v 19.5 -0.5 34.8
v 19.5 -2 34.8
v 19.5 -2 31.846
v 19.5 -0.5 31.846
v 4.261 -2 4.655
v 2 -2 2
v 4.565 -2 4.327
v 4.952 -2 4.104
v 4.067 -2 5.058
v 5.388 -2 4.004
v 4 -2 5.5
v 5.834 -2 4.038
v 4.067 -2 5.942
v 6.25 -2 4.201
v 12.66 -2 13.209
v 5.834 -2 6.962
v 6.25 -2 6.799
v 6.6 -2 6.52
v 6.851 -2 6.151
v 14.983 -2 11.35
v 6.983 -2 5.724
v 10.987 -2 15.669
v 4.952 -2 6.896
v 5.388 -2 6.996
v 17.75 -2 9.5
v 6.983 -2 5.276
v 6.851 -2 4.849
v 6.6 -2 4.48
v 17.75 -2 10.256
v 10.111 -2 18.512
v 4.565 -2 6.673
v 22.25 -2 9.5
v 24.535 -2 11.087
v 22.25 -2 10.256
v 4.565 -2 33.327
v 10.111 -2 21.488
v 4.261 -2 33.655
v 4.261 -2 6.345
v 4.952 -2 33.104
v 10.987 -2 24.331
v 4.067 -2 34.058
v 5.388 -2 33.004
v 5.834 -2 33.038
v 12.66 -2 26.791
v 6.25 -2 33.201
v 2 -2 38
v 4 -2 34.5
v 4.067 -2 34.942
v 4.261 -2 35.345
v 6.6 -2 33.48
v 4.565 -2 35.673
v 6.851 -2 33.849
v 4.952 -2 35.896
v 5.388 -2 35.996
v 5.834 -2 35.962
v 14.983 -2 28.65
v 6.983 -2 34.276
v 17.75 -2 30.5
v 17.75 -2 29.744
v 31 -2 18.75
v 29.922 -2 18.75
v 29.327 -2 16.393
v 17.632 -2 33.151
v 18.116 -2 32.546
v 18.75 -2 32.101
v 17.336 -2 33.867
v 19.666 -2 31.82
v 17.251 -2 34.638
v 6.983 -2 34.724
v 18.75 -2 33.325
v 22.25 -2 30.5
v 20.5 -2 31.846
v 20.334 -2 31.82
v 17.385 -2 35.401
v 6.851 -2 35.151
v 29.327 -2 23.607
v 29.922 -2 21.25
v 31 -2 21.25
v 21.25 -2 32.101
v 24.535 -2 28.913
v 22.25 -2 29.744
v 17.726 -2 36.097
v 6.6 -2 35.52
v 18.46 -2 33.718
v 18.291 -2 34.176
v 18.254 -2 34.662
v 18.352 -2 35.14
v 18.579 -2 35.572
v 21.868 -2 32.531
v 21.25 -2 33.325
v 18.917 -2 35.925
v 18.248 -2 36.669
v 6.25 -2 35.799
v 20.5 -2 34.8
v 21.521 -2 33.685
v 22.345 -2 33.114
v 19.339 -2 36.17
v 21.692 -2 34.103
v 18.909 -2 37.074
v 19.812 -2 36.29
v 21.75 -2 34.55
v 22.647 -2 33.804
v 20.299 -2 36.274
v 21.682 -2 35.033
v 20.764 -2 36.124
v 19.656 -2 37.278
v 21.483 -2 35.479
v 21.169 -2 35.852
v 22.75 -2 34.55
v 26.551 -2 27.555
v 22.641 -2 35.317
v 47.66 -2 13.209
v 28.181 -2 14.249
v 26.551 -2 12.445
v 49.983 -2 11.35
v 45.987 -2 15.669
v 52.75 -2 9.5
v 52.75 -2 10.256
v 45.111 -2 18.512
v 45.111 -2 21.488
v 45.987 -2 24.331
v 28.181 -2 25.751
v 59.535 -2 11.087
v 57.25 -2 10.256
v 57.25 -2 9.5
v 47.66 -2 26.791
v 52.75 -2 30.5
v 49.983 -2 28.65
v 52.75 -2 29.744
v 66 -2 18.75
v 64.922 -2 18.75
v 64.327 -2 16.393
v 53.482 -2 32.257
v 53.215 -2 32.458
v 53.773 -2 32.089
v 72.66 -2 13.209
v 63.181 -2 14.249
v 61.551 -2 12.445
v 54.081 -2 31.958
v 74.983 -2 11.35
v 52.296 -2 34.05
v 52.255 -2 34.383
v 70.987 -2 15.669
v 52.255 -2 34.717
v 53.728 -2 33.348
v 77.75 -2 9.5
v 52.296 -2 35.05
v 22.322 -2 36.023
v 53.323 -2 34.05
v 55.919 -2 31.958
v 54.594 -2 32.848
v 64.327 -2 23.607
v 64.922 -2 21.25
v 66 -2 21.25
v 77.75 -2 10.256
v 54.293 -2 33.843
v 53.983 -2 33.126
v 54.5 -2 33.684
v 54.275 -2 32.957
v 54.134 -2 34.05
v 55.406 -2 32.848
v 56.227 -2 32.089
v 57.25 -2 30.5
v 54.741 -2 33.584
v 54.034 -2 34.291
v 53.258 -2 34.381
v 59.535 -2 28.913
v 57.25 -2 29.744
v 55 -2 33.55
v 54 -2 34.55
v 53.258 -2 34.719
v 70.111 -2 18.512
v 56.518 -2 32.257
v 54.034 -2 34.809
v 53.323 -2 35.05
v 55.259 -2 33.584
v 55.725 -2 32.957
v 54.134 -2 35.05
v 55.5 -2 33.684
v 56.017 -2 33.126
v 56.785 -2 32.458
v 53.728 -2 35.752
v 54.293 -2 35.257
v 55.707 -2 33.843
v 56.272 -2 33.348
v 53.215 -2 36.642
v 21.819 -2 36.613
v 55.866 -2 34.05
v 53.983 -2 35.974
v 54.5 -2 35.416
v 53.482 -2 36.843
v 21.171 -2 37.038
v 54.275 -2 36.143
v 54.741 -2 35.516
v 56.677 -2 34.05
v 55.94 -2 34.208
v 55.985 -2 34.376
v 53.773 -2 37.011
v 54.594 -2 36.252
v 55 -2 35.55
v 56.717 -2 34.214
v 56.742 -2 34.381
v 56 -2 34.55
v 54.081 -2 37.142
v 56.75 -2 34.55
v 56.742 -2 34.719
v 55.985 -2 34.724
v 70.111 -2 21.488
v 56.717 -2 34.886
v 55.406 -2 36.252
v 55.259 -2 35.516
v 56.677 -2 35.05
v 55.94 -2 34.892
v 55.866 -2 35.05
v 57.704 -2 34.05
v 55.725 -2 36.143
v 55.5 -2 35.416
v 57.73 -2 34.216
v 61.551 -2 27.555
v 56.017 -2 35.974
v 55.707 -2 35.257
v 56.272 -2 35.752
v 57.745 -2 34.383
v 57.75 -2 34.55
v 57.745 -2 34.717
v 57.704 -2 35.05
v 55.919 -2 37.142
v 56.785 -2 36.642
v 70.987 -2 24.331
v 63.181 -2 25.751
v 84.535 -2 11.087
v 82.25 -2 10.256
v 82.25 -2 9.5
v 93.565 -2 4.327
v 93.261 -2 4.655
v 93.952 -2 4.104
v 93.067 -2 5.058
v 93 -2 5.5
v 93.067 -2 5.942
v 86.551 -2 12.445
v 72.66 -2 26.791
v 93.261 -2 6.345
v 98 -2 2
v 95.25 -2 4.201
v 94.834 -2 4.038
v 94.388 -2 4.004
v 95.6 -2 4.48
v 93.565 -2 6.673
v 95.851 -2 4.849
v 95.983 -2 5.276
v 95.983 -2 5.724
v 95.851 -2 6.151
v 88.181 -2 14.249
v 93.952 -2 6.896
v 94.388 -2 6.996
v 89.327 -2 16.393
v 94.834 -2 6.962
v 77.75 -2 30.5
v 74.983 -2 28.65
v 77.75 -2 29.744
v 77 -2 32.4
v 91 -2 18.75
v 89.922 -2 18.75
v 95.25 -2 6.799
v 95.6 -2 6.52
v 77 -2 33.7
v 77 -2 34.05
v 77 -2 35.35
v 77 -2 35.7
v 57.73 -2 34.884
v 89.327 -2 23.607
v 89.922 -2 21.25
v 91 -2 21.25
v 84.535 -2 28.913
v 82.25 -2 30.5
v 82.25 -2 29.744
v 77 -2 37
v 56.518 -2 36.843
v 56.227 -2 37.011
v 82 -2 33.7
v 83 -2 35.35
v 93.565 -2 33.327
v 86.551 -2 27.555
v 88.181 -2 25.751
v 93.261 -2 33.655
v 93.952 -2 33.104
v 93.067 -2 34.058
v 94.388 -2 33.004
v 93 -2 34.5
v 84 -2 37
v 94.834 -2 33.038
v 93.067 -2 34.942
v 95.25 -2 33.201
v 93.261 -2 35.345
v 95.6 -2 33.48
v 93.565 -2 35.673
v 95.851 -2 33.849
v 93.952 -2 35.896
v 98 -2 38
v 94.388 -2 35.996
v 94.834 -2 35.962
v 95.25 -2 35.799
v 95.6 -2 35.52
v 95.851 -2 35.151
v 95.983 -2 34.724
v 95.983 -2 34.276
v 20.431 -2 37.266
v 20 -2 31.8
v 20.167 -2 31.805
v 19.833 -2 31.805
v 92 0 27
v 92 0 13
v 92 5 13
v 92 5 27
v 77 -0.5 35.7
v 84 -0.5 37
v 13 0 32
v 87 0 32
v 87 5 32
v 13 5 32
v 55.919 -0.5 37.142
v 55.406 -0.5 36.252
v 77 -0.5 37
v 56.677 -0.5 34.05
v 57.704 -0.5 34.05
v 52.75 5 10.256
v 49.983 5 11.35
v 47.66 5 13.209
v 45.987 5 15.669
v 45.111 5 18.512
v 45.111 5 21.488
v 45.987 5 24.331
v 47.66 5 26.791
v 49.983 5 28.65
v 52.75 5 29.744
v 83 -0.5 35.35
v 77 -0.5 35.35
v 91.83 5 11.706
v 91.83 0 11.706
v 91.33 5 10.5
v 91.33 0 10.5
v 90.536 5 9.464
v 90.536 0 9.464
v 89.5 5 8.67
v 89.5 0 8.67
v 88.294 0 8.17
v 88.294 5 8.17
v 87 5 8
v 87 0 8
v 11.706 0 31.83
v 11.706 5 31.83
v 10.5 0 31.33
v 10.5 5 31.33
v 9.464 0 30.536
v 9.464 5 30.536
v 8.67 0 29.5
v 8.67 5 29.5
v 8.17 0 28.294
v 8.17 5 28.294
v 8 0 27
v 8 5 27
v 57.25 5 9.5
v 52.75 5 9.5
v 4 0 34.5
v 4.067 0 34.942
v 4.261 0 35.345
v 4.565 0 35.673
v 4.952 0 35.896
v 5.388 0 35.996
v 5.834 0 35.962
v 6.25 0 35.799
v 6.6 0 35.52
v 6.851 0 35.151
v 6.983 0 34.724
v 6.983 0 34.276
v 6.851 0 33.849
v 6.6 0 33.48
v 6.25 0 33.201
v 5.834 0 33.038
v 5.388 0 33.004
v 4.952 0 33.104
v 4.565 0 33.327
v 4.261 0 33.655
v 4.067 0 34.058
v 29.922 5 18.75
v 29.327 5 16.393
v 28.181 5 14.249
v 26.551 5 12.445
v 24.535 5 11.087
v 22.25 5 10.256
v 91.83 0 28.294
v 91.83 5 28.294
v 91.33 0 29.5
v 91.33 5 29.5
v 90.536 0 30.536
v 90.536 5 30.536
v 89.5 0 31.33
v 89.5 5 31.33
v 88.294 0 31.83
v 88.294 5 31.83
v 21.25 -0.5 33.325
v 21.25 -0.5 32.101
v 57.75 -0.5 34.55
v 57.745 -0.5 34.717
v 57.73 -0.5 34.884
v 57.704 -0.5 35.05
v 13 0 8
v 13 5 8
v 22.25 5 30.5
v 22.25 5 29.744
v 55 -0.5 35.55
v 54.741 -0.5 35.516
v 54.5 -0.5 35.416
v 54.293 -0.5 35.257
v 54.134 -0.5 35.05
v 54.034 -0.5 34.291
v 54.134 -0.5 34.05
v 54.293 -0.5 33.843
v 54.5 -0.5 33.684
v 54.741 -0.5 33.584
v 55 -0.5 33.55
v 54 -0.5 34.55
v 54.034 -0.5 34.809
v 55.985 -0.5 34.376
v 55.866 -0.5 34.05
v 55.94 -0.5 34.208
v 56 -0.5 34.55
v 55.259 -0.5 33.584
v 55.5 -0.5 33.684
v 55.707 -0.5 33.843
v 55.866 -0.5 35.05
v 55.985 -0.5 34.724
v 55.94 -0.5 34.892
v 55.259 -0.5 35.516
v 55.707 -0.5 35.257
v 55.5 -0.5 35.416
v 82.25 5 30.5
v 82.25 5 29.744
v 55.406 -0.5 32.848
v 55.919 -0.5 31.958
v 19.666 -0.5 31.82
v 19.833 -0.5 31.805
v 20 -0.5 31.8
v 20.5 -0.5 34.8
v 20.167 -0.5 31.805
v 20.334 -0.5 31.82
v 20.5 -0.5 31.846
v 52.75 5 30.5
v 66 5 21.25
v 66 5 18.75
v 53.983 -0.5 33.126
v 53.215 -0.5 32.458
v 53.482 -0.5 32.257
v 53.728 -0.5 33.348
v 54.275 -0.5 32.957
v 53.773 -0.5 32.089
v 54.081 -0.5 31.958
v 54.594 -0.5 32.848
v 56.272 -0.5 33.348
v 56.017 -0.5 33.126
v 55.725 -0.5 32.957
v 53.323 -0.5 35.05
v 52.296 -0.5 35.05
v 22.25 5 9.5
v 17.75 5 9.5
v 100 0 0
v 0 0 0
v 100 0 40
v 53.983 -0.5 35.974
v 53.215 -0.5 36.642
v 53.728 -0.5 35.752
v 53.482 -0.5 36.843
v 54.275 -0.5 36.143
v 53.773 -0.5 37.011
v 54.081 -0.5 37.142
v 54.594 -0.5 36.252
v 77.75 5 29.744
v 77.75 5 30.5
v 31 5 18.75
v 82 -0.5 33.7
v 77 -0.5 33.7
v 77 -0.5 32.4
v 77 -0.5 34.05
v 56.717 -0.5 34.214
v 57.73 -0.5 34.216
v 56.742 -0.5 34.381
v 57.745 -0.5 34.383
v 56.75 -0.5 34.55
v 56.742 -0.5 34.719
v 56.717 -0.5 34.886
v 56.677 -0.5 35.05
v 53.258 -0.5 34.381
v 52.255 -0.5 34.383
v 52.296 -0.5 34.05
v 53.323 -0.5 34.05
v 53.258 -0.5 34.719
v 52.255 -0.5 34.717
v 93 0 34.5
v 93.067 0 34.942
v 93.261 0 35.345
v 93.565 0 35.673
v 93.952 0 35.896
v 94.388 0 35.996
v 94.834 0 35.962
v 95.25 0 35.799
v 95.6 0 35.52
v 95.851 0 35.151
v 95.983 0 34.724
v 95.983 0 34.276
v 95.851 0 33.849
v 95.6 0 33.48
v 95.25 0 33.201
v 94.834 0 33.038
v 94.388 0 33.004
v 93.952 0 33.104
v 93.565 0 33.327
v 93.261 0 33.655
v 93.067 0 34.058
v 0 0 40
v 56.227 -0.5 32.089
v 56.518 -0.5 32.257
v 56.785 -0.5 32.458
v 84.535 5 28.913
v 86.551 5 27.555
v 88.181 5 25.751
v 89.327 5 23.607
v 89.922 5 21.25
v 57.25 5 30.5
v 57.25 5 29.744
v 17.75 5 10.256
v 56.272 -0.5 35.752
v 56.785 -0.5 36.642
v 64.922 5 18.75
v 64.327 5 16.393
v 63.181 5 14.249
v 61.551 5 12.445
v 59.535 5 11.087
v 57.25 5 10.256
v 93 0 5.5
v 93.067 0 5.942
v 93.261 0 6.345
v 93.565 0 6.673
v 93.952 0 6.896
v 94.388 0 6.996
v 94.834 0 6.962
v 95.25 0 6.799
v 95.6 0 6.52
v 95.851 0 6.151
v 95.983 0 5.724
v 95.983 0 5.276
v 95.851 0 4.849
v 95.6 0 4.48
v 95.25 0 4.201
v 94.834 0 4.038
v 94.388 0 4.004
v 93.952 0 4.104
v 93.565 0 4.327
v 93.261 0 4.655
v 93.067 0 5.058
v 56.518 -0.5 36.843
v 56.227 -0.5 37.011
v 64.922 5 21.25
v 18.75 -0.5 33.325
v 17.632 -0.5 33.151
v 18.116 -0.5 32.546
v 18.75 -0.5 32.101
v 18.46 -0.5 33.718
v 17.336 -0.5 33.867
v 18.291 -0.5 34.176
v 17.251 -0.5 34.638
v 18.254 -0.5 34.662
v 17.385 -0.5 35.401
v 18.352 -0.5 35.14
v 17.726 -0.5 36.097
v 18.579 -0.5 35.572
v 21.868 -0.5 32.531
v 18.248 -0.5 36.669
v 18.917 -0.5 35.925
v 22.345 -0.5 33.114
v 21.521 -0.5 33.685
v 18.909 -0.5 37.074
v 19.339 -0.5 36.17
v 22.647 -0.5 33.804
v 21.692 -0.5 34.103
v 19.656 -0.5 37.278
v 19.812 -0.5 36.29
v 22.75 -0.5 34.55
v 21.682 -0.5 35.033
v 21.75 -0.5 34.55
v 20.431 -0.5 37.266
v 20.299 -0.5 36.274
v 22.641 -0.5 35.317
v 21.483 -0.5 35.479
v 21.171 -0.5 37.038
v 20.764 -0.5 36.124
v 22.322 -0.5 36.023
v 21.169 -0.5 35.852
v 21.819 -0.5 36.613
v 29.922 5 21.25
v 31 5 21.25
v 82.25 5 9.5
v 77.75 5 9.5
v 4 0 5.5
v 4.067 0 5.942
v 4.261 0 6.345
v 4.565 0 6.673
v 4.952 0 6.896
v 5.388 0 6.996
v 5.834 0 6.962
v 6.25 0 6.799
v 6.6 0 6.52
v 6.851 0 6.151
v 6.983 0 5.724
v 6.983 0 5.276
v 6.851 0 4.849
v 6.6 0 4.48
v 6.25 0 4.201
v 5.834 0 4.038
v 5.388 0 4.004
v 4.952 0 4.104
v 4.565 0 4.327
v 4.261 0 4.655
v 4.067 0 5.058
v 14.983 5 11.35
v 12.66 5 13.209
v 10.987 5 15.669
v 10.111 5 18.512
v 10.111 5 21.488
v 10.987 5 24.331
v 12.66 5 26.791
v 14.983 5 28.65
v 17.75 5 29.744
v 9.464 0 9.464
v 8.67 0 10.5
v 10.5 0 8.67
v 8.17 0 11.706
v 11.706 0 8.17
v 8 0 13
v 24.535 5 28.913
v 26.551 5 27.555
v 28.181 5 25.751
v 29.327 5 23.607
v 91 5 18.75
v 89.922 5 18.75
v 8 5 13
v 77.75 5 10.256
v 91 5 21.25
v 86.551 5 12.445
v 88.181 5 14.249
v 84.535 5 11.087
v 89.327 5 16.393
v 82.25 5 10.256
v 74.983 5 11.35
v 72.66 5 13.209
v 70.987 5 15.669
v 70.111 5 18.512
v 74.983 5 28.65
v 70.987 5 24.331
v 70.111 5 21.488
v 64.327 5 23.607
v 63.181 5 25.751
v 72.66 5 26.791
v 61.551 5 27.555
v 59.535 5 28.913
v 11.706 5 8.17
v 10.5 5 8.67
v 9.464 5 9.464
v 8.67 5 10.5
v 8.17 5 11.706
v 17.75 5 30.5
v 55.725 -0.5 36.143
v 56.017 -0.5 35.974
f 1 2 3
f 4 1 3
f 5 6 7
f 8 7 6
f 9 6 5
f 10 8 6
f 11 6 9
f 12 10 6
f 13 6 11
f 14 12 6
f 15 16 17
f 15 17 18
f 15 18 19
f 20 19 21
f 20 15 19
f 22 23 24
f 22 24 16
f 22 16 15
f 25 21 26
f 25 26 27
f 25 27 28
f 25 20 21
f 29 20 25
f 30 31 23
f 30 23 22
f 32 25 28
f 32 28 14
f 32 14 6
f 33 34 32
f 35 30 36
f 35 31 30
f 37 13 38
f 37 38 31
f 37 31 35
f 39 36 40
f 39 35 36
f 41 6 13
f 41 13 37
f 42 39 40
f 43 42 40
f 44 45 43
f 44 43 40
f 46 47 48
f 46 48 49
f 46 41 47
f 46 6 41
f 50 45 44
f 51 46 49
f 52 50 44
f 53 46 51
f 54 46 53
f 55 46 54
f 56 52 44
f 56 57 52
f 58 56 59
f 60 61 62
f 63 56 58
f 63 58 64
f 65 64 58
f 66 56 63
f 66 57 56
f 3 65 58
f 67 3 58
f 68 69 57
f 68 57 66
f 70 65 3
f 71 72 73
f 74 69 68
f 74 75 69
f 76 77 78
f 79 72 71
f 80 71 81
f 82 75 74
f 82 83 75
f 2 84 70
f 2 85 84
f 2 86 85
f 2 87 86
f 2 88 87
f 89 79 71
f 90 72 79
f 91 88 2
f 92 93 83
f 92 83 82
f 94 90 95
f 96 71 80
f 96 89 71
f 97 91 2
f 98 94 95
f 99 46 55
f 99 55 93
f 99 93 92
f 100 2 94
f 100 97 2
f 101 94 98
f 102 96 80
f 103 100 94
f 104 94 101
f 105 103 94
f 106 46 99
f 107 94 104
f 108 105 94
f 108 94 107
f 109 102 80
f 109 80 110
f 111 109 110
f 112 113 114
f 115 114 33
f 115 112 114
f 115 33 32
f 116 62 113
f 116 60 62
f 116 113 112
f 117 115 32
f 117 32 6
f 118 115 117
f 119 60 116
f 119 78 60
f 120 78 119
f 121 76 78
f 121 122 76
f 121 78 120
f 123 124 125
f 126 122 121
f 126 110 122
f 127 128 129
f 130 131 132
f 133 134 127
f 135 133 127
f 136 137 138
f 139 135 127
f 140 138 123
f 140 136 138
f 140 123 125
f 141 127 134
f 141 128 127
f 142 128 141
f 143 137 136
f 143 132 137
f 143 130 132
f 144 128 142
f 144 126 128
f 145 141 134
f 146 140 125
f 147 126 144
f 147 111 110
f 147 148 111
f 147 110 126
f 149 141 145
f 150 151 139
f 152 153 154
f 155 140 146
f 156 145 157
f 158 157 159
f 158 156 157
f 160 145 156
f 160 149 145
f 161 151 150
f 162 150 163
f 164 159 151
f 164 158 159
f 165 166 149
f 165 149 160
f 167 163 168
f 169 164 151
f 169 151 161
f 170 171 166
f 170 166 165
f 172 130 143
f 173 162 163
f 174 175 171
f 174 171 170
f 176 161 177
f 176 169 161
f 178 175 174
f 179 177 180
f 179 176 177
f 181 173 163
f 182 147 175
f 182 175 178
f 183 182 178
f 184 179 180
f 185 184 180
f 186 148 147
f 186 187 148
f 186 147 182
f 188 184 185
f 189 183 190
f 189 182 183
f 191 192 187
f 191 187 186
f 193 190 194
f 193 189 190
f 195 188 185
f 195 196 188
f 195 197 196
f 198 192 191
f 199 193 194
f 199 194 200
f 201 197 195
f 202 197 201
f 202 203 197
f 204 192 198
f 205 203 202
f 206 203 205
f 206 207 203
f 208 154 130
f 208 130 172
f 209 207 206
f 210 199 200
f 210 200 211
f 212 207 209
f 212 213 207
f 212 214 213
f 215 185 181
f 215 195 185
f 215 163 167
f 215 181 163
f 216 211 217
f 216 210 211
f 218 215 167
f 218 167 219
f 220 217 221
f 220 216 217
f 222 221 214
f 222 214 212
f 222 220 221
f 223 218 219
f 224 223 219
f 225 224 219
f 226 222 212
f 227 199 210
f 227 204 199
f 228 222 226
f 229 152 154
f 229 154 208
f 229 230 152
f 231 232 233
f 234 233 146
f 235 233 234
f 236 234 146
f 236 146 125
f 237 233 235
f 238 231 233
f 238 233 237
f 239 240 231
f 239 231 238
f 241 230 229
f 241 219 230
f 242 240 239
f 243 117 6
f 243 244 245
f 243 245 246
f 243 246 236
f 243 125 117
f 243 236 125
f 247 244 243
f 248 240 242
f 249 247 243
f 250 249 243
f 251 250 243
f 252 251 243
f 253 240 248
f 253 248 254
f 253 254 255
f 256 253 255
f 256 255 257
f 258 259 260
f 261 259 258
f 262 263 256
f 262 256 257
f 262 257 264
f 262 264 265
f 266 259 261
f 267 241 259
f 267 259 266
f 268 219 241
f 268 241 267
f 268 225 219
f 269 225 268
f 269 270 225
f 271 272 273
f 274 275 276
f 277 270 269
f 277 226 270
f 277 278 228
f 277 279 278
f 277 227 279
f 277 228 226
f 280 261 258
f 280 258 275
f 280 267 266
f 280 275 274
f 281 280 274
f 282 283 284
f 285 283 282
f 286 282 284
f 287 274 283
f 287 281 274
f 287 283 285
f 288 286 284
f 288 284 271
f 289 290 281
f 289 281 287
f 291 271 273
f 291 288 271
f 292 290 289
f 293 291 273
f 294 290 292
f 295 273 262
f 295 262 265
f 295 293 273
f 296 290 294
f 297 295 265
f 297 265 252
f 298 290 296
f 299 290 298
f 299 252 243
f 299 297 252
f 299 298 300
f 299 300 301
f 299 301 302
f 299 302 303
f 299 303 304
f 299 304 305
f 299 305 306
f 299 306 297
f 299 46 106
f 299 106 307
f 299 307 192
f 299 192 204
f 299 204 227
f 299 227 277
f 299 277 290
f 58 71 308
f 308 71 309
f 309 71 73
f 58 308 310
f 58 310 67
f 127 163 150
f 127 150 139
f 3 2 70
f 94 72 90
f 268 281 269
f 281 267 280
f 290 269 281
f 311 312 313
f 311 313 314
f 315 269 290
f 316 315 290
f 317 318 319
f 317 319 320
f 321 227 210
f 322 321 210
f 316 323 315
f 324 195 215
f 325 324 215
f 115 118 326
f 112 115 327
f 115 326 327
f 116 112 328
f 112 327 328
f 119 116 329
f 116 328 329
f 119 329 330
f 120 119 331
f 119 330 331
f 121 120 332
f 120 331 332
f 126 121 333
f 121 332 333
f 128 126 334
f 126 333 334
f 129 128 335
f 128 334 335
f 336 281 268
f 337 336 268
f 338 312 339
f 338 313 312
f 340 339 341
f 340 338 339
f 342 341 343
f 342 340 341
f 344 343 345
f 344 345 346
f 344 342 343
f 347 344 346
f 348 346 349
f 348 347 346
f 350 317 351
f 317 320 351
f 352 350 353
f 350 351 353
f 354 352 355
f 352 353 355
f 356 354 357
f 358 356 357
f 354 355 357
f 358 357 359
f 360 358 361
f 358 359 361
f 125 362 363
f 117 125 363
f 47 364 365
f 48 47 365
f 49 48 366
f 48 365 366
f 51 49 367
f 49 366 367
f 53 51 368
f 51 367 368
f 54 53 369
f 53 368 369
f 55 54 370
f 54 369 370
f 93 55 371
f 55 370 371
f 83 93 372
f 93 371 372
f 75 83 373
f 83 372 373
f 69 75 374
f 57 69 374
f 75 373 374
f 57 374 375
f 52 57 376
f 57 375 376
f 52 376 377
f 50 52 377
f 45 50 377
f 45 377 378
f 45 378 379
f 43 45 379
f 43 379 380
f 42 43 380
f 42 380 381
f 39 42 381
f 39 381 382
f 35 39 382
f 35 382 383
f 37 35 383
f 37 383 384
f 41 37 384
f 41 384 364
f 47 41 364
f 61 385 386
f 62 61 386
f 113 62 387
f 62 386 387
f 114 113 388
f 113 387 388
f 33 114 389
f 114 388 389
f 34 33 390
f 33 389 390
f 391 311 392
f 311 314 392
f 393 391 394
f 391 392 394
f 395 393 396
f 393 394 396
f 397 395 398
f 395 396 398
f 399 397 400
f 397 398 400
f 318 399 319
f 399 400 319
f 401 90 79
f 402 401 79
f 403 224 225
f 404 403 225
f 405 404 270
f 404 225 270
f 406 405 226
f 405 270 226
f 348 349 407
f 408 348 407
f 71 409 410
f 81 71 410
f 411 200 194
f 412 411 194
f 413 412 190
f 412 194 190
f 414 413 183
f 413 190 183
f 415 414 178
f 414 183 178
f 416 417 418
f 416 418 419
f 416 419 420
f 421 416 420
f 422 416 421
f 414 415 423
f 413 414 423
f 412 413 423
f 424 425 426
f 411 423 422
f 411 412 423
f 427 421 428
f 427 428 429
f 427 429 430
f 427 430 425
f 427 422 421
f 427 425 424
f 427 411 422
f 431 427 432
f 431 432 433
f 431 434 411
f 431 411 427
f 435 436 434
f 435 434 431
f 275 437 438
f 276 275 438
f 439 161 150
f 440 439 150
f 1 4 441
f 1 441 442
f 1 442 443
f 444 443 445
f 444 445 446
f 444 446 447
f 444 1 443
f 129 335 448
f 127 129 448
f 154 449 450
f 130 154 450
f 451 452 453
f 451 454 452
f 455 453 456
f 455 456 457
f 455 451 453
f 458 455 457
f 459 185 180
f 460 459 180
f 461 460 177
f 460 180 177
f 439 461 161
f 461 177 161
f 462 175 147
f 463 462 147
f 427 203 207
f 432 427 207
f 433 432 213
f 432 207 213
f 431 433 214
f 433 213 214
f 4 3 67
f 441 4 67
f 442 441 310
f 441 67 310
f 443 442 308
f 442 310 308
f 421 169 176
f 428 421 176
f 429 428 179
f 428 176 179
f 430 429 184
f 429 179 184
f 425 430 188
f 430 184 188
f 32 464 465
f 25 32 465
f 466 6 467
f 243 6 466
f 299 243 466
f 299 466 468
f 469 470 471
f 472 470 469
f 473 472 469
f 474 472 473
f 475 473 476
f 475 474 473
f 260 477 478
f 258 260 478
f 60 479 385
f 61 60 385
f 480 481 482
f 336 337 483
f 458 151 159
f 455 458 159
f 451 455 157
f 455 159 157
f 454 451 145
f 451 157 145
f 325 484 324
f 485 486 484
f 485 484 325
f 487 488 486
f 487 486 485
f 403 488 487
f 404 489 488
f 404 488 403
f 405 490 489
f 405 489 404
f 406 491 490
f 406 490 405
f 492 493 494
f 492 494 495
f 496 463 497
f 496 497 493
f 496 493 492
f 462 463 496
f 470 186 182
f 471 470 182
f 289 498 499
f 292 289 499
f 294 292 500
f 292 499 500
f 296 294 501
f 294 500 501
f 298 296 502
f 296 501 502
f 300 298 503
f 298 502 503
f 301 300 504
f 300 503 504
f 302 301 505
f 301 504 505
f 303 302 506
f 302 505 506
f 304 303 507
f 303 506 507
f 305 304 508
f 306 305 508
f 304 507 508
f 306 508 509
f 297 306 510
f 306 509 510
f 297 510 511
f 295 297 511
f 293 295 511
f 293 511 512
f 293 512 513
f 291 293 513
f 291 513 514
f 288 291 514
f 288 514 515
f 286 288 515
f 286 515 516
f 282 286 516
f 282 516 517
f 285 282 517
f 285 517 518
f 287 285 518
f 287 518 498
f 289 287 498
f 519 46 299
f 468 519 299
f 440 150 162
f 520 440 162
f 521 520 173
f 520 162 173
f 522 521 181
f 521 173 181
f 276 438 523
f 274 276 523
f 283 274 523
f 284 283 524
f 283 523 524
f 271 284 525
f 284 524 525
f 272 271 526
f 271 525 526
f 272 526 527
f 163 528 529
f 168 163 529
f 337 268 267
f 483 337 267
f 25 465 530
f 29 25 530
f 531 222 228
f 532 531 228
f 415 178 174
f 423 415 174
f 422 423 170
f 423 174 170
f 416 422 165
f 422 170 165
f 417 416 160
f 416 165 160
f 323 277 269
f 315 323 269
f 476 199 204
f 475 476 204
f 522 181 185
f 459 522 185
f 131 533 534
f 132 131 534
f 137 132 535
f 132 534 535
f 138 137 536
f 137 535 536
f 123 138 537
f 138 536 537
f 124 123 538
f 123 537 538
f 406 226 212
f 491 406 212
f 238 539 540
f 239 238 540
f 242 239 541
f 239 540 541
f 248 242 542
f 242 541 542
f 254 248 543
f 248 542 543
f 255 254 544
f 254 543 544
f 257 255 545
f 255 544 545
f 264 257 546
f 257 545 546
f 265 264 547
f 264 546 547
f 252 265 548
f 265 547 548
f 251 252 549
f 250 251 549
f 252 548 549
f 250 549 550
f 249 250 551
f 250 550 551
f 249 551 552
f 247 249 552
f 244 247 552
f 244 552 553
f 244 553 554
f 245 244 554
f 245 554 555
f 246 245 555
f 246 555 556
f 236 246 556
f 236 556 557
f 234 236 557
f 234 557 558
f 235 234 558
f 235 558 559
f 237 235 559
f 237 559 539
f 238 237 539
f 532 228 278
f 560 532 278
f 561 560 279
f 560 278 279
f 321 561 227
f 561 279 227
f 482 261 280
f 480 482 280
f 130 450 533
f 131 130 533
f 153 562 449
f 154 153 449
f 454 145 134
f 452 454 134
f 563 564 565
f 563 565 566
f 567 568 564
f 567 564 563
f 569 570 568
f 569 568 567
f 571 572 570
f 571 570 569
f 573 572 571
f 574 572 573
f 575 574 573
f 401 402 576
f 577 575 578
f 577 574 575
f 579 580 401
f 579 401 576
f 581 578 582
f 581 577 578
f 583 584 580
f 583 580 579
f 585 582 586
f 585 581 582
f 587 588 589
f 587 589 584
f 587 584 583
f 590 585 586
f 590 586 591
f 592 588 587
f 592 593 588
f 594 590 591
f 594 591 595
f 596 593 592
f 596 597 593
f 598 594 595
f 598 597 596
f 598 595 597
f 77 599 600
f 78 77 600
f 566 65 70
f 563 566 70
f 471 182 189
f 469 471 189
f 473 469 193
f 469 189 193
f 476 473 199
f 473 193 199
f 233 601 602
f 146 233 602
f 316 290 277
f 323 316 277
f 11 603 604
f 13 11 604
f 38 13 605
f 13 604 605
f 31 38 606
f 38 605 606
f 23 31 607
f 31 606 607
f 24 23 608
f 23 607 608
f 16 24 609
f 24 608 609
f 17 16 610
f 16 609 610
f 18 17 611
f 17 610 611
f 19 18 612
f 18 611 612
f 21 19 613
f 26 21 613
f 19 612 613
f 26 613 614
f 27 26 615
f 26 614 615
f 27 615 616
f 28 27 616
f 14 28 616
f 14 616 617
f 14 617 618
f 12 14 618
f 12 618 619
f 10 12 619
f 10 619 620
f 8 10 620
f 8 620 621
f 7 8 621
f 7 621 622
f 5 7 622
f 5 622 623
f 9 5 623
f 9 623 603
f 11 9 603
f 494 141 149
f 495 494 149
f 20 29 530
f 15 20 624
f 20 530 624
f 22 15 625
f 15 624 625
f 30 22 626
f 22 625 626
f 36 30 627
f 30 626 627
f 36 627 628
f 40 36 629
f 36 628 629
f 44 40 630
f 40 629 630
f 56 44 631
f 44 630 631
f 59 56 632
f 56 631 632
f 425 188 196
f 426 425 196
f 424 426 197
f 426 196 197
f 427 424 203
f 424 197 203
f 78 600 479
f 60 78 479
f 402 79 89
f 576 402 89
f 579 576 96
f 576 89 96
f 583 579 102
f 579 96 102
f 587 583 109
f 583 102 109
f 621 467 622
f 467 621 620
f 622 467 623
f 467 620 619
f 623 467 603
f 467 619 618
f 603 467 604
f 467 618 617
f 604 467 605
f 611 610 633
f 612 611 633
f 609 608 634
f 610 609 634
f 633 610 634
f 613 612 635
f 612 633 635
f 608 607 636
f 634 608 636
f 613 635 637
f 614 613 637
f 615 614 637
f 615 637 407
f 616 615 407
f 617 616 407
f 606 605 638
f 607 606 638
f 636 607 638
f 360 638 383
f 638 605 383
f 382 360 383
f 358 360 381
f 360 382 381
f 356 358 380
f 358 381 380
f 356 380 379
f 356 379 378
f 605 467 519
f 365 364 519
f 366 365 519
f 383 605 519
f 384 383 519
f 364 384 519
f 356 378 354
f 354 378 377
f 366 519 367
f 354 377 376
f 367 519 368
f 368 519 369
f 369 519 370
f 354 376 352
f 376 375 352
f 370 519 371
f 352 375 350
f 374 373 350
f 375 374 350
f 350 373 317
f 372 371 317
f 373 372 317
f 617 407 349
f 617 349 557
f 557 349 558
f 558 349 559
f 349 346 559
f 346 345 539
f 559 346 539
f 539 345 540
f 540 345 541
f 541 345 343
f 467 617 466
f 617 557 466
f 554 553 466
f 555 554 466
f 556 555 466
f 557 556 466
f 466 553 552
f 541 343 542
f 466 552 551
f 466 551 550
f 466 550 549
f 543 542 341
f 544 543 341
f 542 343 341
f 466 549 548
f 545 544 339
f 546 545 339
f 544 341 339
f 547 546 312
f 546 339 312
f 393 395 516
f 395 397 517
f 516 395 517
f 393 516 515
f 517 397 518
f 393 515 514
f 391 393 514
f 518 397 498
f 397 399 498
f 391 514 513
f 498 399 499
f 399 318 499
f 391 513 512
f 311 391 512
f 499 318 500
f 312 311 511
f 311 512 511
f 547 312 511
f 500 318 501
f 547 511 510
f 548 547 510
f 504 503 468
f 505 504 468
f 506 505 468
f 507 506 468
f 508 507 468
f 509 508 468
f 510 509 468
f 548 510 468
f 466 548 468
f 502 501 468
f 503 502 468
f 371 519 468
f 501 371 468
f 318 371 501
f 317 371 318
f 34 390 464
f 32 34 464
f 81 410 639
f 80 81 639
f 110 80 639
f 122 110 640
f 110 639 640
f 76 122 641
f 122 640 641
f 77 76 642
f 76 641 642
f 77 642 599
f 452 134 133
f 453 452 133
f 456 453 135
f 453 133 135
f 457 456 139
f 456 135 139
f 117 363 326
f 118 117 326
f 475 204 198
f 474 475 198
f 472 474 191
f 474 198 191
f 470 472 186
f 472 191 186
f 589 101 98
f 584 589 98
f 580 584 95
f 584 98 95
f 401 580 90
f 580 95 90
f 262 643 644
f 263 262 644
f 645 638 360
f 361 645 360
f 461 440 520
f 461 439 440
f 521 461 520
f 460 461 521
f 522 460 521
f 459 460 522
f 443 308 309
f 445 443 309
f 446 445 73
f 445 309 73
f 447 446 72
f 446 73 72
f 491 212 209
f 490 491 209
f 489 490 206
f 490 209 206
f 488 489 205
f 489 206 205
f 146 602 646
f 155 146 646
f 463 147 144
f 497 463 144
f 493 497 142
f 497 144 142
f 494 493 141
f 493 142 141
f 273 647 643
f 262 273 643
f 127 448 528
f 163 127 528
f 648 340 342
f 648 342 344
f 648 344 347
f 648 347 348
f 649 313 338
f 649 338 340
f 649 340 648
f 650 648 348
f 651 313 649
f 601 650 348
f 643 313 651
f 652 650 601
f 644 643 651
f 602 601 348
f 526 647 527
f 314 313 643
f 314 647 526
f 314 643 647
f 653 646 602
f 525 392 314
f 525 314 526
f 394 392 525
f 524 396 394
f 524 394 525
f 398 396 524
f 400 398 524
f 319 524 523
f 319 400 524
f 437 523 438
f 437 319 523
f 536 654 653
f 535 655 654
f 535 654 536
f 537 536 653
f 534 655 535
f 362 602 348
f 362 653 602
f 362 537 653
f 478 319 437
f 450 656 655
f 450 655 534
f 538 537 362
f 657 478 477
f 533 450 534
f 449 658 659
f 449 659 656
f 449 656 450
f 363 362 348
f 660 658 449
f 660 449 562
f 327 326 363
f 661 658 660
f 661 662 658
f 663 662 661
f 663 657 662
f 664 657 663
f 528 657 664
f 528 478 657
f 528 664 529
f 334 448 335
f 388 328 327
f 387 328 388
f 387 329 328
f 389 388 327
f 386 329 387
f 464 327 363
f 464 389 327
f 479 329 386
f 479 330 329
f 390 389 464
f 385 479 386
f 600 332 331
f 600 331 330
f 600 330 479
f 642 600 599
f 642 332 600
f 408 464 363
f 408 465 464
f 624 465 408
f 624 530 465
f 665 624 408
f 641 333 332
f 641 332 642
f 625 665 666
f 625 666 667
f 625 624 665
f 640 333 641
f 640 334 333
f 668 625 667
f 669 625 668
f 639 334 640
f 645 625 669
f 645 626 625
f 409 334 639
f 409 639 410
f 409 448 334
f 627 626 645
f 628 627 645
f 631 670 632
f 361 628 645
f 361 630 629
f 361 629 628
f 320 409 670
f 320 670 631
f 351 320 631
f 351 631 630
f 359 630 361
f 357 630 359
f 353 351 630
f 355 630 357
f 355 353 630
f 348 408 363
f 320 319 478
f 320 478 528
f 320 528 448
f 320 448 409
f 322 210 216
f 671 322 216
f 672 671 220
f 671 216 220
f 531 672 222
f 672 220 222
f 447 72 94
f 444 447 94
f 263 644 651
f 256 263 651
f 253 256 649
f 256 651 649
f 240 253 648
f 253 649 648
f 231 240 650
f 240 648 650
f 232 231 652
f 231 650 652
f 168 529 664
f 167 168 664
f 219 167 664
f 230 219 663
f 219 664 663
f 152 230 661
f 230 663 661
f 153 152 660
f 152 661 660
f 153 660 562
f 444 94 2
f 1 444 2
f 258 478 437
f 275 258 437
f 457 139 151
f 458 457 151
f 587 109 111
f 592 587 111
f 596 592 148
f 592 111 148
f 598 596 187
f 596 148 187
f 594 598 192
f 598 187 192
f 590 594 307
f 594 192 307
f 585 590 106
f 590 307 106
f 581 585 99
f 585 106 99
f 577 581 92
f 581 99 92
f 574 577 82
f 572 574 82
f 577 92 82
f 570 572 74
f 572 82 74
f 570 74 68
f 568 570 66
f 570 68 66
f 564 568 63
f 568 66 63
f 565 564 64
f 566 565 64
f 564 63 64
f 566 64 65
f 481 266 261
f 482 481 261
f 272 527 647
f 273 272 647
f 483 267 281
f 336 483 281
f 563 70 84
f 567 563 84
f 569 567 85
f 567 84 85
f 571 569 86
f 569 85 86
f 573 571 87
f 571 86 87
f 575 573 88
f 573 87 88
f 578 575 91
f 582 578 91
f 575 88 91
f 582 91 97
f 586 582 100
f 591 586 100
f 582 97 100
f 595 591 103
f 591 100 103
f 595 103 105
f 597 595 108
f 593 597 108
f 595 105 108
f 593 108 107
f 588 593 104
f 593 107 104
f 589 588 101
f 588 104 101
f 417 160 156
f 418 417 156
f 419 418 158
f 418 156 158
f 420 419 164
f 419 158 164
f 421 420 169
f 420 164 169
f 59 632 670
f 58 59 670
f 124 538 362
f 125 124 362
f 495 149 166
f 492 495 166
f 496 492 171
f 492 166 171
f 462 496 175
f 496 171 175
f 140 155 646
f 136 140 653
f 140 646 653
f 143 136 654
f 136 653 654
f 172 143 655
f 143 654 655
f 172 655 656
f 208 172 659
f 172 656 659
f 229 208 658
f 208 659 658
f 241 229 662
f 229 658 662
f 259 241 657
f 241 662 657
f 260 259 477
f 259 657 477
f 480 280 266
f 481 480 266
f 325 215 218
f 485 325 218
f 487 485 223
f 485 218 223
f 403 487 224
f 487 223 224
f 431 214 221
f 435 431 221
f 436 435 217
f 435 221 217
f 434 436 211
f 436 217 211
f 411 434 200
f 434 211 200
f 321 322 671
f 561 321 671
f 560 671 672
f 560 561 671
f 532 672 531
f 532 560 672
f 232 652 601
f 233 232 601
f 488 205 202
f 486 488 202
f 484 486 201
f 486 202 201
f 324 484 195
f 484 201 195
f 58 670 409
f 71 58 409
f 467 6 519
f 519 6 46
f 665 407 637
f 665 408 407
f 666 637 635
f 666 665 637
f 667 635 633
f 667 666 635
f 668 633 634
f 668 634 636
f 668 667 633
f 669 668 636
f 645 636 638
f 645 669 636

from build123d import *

# Parameters (mm, degrees)
F0_W      = 100
F0_H      = 40
F1_DEPTH  = 2
F2_SIZE   = 1.99999
F3_W      = 84
F3_H      = 24
F4_DEPTH  = 5
F5_R      = 1.5
F6_DEPTH  = 2.001
F7_R      = 5
F8_R      = 10
F9_DEPTH  = 7.001
F11_DEPTH = 7.001
F13_DEPTH = 7.001
F15_DEPTH = 1.5
F17_DEPTH = 1.5
F19_DEPTH = 1.5


# Not quite as in the source:
# - a fillet or chamfer is up to 0.001 mm smaller than in the source, because OpenCascade refuses the exact size


with BuildPart() as f1:
    # F0 (on Front) → F1 (new body)
    with BuildSketch(Plane.XZ):
        with Locations((50, 20)):
            Rectangle(F0_W, F0_H)
    extrude(amount=F1_DEPTH)

    # F2 (size 2 in the source; OpenCascade refuses exactly that, so slightly less here)
    f2_edges = [f1.edges().sort_by_distance(p)[0] for p in [
        (100, -2, 20),
        (50, -2, 40),
        (50, -2, 0),
        (0, -2, 20),
    ]]
    chamfer(f2_edges, length=F2_SIZE)

    # F3 (on face) → F4 (join)
    with BuildSketch(Plane(origin=(0, 0, 0), x_dir=(-1, 0, 0), z_dir=(0, 1, 0))):
        with Locations((-50, 20)):
            Rectangle(F3_W, F3_H)
    extrude(amount=F4_DEPTH)

    # F5 (on face) → F6 (cut, through all)
    with BuildSketch(Plane(origin=(0, 0, 0), x_dir=(-1, 0, 0), z_dir=(0, 1, 0))):
        with Locations((-94.5, 34.5)):
            Circle(F5_R)
        with Locations((-94.5, 5.5)):
            Circle(F5_R)
        with Locations((-5.5, 34.5)):
            Circle(F5_R)
        with Locations((-5.5, 5.5)):
            Circle(F5_R)
    extrude(amount=-F6_DEPTH, mode=Mode.SUBTRACT)

    # F7
    f7_edges = [f1.edges().sort_by_distance(p)[0] for p in [
        (92, 2.5, 8),
        (92, 2.5, 32),
        (8, 2.5, 8),
        (8, 2.5, 32),
    ]]
    fillet(f7_edges, radius=F7_R)

    # F8 (on face) → F9 (cut, through all)
    with BuildSketch(Plane(origin=(0, 5, 0), x_dir=(-1, 0, 0), z_dir=(0, 1, 0))):
        with Locations((-80, 20)):
            Circle(F8_R)
        with Locations((-55, 20)):
            Circle(F8_R)
        with Locations((-20, 20)):
            Circle(F8_R)
    extrude(amount=-F9_DEPTH, mode=Mode.SUBTRACT)

    # F10 (on face) → F11 (cut, through all)
    with BuildSketch(Plane(origin=(0, 5, 0), x_dir=(-1, 0, 0), z_dir=(0, 1, 0))):
        with BuildLine():
            Line((-89.9215674165, 21.25), (-91, 21.25))
            Line((-91, 21.25), (-91, 18.75))
            Line((-91, 18.75), (-89.9215674165, 18.75))
            ThreePointArc((-89.9215674165, 18.75), (-90, 20), (-89.9215674165, 21.25))
        make_face()
        with BuildLine():
            Line((-64.9215674165, 21.25), (-66, 21.25))
            Line((-66, 21.25), (-66, 18.75))
            Line((-66, 18.75), (-64.9215674165, 18.75))
            ThreePointArc((-64.9215674165, 18.75), (-65, 20), (-64.9215674165, 21.25))
        make_face()
        with BuildLine():
            Line((-29.9215674165, 21.25), (-31, 21.25))
            Line((-31, 21.25), (-31, 18.75))
            Line((-31, 18.75), (-29.9215674165, 18.75))
            ThreePointArc((-29.9215674165, 18.75), (-30, 20), (-29.9215674165, 21.25))
        make_face()
    extrude(amount=-F11_DEPTH, mode=Mode.SUBTRACT)

    # F12 (on face) → F13 (cut, through all)
    with BuildSketch(Plane(origin=(0, 5, 0), x_dir=(-1, 0, 0), z_dir=(0, 1, 0))):
        with BuildLine():
            Line((-77.75, 30.5), (-82.25, 30.5))
            Line((-82.25, 30.5), (-82.25, 29.743587635))
            ThreePointArc((-82.25, 29.743587635), (-80, 30), (-77.75, 29.743587635))
            Line((-77.75, 29.743587635), (-77.75, 30.5))
        make_face()
        with BuildLine():
            ThreePointArc((-77.75, 10.256412365), (-80, 10), (-82.25, 10.256412365))
            Line((-82.25, 10.256412365), (-82.25, 9.5))
            Line((-82.25, 9.5), (-77.75, 9.5))
            Line((-77.75, 9.5), (-77.75, 10.256412365))
        make_face()
        with BuildLine():
            ThreePointArc((-52.75, 10.256412365), (-55, 10), (-57.25, 10.256412365))
            Line((-57.25, 10.256412365), (-57.25, 9.5))
            Line((-57.25, 9.5), (-52.75, 9.5))
            Line((-52.75, 9.5), (-52.75, 10.256412365))
        make_face()
        with BuildLine():
            Line((-52.75, 30.5), (-57.25, 30.5))
            Line((-57.25, 30.5), (-57.25, 29.743587635))
            ThreePointArc((-57.25, 29.743587635), (-55, 30), (-52.75, 29.743587635))
            Line((-52.75, 29.743587635), (-52.75, 30.5))
        make_face()
        with BuildLine():
            Line((-17.75, 30.5), (-22.25, 30.5))
            Line((-22.25, 30.5), (-22.25, 29.743587635))
            ThreePointArc((-22.25, 29.743587635), (-20, 30), (-17.75, 29.743587635))
            Line((-17.75, 29.743587635), (-17.75, 30.5))
        make_face()
        with BuildLine():
            ThreePointArc((-17.75, 10.256412365), (-20, 10), (-22.25, 10.256412365))
            Line((-22.25, 10.256412365), (-22.25, 9.5))
            Line((-22.25, 9.5), (-17.75, 9.5))
            Line((-17.75, 9.5), (-17.75, 10.256412365))
        make_face()
    extrude(amount=-F13_DEPTH, mode=Mode.SUBTRACT)

    # F14 (on face) → F15 (cut)
    with BuildSketch(Plane.XZ.offset(2)):
        with BuildLine():
            ThreePointArc((22.75, 34.55), (18.5638593384, 36.8952078799), (18.75, 32.1005102572))
            Line((18.75, 32.1005102572), (18.75, 33.3252551286))
            ThreePointArc((18.75, 33.3252551286), (19.3385621722, 36.1701851746), (21.75, 34.55))
            ThreePointArc((21.75, 34.55), (21.6201851746, 33.8885621722), (21.25, 33.3252551286))
            Line((21.25, 33.3252551286), (21.25, 32.1005102572))
            ThreePointArc((21.25, 32.1005102572), (22.3452078799, 33.1138593384), (22.75, 34.55))
        make_face()
        with BuildLine():
            Line((19.5, 34.8), (19.5, 32.8729490169))
            ThreePointArc((19.5, 32.8729490169), (20, 32.8), (20.5, 32.8729490169))
            Line((20.5, 32.8729490169), (20.5, 34.8))
            Line((20.5, 34.8), (19.5, 34.8))
        make_face()
        with BuildLine():
            ThreePointArc((19.5, 31.8458365434), (19.7489517035, 31.8114831107), (20, 31.8))
            ThreePointArc((20, 31.8), (20.2510482965, 31.8114831107), (20.5, 31.8458365434))
            Line((20.5, 31.8458365434), (20.5, 32.8729490169))
            ThreePointArc((20.5, 32.8729490169), (20, 32.8), (19.5, 32.8729490169))
            Line((19.5, 32.8729490169), (19.5, 31.8458365434))
        make_face()
    extrude(amount=-F15_DEPTH, mode=Mode.SUBTRACT)

    # F16 (on face) → F17 (cut)
    with BuildSketch(Plane.XZ.offset(2)):
        with BuildLine():
            ThreePointArc((54.1339745962, 34.05), (54.5, 33.6839745962), (55, 33.55))
            Line((55, 33.55), (54.7113248654, 34.05))
            Line((54.7113248654, 34.05), (54.1339745962, 34.05))
        make_face()
        Polygon((54.4226497308, 34.55), (54.1339745962, 34.05), (54.7113248654, 34.05), align=None)
        with BuildLine():
            Line((54.4226497308, 34.55), (54.1339745962, 35.05))
            ThreePointArc((54.1339745962, 35.05), (54, 34.55), (54.1339745962, 34.05))
            Line((54.1339745962, 34.05), (54.4226497308, 34.55))
        make_face()
        Polygon((54.7113248654, 35.05), (54.1339745962, 35.05), (54.4226497308, 34.55), align=None)
        with BuildLine():
            Line((54.7113248654, 35.05), (55, 35.55))
            ThreePointArc((55, 35.55), (54.5, 35.4160254038), (54.1339745962, 35.05))
            Line((54.1339745962, 35.05), (54.7113248654, 35.05))
        make_face()
        Polygon((55.2886751346, 35.05), (55, 35.55), (54.7113248654, 35.05), align=None)
        Polygon((55.5773502692, 34.55), (55.2886751346, 35.05), (54.7113248654, 35.05), (54.4226497308, 34.55), (54.7113248654, 34.05), (55.2886751346, 34.05), align=None)
        Polygon((54.7113248654, 34.05), (55, 33.55), (55.2886751346, 34.05), align=None)
        with BuildLine():
            ThreePointArc((55, 33.55), (55.5, 33.6839745962), (55.8660254038, 34.05))
            Line((55.8660254038, 34.05), (55.2886751346, 34.05))
            Line((55.2886751346, 34.05), (55, 33.55))
        make_face()
        with BuildLine():
            ThreePointArc((56, 34.55), (55.9659258263, 34.8088190451), (55.8660254038, 35.05))
            Line((55.8660254038, 35.05), (55.5773502692, 34.55))
            Line((55.5773502692, 34.55), (55.8660254038, 34.05))
            ThreePointArc((55.8660254038, 34.05), (55.9659258263, 34.2911809549), (56, 34.55))
        make_face()
        Polygon((55.5773502692, 34.55), (55.8660254038, 35.05), (55.2886751346, 35.05), align=None)
        with BuildLine():
            Line((55.2886751346, 35.05), (55.8660254038, 35.05))
            ThreePointArc((55.8660254038, 35.05), (55.5, 35.4160254038), (55, 35.55))
            Line((55, 35.55), (55.2886751346, 35.05))
        make_face()
        Polygon((55.2886751346, 34.05), (55.8660254038, 34.05), (55.5773502692, 34.55), align=None)
        with BuildLine():
            ThreePointArc((53.2149055698, 32.4581257506), (53.625, 32.1684301396), (54.0809309736, 31.9581257506))
            Line((54.0809309736, 31.9581257506), (54.5944872103, 32.8476312452))
            ThreePointArc((54.5944872103, 32.8476312452), (54.125, 33.0344555434), (53.7284618065, 33.3476312452))
            Line((53.7284618065, 33.3476312452), (53.2149055698, 32.4581257506))
        make_face()
        with BuildLine():
            ThreePointArc((55.9190690264, 31.9581257506), (56.375, 32.1684301396), (56.7850944302, 32.4581257506))
            Line((56.7850944302, 32.4581257506), (56.2715381935, 33.3476312452))
            ThreePointArc((56.2715381935, 33.3476312452), (55.875, 33.0344555434), (55.4055127897, 32.8476312452))
            Line((55.4055127897, 32.8476312452), (55.9190690264, 31.9581257506))
        make_face()
        with BuildLine():
            ThreePointArc((57.7041634566, 34.05), (57.7385168893, 34.2989517035), (57.75, 34.55))
            ThreePointArc((57.75, 34.55), (57.7385168893, 34.8010482965), (57.7041634566, 35.05))
            Line((57.7041634566, 35.05), (56.6770509831, 35.05))
            ThreePointArc((56.6770509831, 35.05), (56.7316667145, 34.8026467688), (56.75, 34.55))
            ThreePointArc((56.75, 34.55), (56.7316667145, 34.2973532312), (56.6770509831, 34.05))
            Line((56.6770509831, 34.05), (57.7041634566, 34.05))
        make_face()
        with BuildLine():
            Line((56.2715381935, 35.7523687548), (56.7850944302, 36.6418742494))
            ThreePointArc((56.7850944302, 36.6418742494), (56.375, 36.9315698604), (55.9190690264, 37.1418742494))
            Line((55.9190690264, 37.1418742494), (55.4055127897, 36.2523687548))
            ThreePointArc((55.4055127897, 36.2523687548), (55.875, 36.0655444566), (56.2715381935, 35.7523687548))
        make_face()
        with BuildLine():
            Line((54.5944872103, 36.2523687548), (54.0809309736, 37.1418742494))
            ThreePointArc((54.0809309736, 37.1418742494), (53.625, 36.9315698604), (53.2149055698, 36.6418742494))
            Line((53.2149055698, 36.6418742494), (53.7284618065, 35.7523687548))
            ThreePointArc((53.7284618065, 35.7523687548), (54.125, 36.0655444566), (54.5944872103, 36.2523687548))
        make_face()
        with BuildLine():
            Line((53.3229490169, 35.05), (52.2958365434, 35.05))
            ThreePointArc((52.2958365434, 35.05), (52.25, 34.55), (52.2958365434, 34.05))
            Line((52.2958365434, 34.05), (53.3229490169, 34.05))
            ThreePointArc((53.3229490169, 34.05), (53.25, 34.55), (53.3229490169, 35.05))
        make_face()
    extrude(amount=-F17_DEPTH, mode=Mode.SUBTRACT)

    # F18 (on face) → F19 (cut)
    with BuildSketch(Plane.XZ.offset(2)):
        Polygon((77, 35.7), (84, 37), (77, 37), align=None)
        Polygon((83, 35.35), (77, 35.35), (77, 34.05), align=None)
        Polygon((77, 32.4), (82, 33.7), (77, 33.7), align=None)
    extrude(amount=-F19_DEPTH, mode=Mode.SUBTRACT)


solid = f1.part
